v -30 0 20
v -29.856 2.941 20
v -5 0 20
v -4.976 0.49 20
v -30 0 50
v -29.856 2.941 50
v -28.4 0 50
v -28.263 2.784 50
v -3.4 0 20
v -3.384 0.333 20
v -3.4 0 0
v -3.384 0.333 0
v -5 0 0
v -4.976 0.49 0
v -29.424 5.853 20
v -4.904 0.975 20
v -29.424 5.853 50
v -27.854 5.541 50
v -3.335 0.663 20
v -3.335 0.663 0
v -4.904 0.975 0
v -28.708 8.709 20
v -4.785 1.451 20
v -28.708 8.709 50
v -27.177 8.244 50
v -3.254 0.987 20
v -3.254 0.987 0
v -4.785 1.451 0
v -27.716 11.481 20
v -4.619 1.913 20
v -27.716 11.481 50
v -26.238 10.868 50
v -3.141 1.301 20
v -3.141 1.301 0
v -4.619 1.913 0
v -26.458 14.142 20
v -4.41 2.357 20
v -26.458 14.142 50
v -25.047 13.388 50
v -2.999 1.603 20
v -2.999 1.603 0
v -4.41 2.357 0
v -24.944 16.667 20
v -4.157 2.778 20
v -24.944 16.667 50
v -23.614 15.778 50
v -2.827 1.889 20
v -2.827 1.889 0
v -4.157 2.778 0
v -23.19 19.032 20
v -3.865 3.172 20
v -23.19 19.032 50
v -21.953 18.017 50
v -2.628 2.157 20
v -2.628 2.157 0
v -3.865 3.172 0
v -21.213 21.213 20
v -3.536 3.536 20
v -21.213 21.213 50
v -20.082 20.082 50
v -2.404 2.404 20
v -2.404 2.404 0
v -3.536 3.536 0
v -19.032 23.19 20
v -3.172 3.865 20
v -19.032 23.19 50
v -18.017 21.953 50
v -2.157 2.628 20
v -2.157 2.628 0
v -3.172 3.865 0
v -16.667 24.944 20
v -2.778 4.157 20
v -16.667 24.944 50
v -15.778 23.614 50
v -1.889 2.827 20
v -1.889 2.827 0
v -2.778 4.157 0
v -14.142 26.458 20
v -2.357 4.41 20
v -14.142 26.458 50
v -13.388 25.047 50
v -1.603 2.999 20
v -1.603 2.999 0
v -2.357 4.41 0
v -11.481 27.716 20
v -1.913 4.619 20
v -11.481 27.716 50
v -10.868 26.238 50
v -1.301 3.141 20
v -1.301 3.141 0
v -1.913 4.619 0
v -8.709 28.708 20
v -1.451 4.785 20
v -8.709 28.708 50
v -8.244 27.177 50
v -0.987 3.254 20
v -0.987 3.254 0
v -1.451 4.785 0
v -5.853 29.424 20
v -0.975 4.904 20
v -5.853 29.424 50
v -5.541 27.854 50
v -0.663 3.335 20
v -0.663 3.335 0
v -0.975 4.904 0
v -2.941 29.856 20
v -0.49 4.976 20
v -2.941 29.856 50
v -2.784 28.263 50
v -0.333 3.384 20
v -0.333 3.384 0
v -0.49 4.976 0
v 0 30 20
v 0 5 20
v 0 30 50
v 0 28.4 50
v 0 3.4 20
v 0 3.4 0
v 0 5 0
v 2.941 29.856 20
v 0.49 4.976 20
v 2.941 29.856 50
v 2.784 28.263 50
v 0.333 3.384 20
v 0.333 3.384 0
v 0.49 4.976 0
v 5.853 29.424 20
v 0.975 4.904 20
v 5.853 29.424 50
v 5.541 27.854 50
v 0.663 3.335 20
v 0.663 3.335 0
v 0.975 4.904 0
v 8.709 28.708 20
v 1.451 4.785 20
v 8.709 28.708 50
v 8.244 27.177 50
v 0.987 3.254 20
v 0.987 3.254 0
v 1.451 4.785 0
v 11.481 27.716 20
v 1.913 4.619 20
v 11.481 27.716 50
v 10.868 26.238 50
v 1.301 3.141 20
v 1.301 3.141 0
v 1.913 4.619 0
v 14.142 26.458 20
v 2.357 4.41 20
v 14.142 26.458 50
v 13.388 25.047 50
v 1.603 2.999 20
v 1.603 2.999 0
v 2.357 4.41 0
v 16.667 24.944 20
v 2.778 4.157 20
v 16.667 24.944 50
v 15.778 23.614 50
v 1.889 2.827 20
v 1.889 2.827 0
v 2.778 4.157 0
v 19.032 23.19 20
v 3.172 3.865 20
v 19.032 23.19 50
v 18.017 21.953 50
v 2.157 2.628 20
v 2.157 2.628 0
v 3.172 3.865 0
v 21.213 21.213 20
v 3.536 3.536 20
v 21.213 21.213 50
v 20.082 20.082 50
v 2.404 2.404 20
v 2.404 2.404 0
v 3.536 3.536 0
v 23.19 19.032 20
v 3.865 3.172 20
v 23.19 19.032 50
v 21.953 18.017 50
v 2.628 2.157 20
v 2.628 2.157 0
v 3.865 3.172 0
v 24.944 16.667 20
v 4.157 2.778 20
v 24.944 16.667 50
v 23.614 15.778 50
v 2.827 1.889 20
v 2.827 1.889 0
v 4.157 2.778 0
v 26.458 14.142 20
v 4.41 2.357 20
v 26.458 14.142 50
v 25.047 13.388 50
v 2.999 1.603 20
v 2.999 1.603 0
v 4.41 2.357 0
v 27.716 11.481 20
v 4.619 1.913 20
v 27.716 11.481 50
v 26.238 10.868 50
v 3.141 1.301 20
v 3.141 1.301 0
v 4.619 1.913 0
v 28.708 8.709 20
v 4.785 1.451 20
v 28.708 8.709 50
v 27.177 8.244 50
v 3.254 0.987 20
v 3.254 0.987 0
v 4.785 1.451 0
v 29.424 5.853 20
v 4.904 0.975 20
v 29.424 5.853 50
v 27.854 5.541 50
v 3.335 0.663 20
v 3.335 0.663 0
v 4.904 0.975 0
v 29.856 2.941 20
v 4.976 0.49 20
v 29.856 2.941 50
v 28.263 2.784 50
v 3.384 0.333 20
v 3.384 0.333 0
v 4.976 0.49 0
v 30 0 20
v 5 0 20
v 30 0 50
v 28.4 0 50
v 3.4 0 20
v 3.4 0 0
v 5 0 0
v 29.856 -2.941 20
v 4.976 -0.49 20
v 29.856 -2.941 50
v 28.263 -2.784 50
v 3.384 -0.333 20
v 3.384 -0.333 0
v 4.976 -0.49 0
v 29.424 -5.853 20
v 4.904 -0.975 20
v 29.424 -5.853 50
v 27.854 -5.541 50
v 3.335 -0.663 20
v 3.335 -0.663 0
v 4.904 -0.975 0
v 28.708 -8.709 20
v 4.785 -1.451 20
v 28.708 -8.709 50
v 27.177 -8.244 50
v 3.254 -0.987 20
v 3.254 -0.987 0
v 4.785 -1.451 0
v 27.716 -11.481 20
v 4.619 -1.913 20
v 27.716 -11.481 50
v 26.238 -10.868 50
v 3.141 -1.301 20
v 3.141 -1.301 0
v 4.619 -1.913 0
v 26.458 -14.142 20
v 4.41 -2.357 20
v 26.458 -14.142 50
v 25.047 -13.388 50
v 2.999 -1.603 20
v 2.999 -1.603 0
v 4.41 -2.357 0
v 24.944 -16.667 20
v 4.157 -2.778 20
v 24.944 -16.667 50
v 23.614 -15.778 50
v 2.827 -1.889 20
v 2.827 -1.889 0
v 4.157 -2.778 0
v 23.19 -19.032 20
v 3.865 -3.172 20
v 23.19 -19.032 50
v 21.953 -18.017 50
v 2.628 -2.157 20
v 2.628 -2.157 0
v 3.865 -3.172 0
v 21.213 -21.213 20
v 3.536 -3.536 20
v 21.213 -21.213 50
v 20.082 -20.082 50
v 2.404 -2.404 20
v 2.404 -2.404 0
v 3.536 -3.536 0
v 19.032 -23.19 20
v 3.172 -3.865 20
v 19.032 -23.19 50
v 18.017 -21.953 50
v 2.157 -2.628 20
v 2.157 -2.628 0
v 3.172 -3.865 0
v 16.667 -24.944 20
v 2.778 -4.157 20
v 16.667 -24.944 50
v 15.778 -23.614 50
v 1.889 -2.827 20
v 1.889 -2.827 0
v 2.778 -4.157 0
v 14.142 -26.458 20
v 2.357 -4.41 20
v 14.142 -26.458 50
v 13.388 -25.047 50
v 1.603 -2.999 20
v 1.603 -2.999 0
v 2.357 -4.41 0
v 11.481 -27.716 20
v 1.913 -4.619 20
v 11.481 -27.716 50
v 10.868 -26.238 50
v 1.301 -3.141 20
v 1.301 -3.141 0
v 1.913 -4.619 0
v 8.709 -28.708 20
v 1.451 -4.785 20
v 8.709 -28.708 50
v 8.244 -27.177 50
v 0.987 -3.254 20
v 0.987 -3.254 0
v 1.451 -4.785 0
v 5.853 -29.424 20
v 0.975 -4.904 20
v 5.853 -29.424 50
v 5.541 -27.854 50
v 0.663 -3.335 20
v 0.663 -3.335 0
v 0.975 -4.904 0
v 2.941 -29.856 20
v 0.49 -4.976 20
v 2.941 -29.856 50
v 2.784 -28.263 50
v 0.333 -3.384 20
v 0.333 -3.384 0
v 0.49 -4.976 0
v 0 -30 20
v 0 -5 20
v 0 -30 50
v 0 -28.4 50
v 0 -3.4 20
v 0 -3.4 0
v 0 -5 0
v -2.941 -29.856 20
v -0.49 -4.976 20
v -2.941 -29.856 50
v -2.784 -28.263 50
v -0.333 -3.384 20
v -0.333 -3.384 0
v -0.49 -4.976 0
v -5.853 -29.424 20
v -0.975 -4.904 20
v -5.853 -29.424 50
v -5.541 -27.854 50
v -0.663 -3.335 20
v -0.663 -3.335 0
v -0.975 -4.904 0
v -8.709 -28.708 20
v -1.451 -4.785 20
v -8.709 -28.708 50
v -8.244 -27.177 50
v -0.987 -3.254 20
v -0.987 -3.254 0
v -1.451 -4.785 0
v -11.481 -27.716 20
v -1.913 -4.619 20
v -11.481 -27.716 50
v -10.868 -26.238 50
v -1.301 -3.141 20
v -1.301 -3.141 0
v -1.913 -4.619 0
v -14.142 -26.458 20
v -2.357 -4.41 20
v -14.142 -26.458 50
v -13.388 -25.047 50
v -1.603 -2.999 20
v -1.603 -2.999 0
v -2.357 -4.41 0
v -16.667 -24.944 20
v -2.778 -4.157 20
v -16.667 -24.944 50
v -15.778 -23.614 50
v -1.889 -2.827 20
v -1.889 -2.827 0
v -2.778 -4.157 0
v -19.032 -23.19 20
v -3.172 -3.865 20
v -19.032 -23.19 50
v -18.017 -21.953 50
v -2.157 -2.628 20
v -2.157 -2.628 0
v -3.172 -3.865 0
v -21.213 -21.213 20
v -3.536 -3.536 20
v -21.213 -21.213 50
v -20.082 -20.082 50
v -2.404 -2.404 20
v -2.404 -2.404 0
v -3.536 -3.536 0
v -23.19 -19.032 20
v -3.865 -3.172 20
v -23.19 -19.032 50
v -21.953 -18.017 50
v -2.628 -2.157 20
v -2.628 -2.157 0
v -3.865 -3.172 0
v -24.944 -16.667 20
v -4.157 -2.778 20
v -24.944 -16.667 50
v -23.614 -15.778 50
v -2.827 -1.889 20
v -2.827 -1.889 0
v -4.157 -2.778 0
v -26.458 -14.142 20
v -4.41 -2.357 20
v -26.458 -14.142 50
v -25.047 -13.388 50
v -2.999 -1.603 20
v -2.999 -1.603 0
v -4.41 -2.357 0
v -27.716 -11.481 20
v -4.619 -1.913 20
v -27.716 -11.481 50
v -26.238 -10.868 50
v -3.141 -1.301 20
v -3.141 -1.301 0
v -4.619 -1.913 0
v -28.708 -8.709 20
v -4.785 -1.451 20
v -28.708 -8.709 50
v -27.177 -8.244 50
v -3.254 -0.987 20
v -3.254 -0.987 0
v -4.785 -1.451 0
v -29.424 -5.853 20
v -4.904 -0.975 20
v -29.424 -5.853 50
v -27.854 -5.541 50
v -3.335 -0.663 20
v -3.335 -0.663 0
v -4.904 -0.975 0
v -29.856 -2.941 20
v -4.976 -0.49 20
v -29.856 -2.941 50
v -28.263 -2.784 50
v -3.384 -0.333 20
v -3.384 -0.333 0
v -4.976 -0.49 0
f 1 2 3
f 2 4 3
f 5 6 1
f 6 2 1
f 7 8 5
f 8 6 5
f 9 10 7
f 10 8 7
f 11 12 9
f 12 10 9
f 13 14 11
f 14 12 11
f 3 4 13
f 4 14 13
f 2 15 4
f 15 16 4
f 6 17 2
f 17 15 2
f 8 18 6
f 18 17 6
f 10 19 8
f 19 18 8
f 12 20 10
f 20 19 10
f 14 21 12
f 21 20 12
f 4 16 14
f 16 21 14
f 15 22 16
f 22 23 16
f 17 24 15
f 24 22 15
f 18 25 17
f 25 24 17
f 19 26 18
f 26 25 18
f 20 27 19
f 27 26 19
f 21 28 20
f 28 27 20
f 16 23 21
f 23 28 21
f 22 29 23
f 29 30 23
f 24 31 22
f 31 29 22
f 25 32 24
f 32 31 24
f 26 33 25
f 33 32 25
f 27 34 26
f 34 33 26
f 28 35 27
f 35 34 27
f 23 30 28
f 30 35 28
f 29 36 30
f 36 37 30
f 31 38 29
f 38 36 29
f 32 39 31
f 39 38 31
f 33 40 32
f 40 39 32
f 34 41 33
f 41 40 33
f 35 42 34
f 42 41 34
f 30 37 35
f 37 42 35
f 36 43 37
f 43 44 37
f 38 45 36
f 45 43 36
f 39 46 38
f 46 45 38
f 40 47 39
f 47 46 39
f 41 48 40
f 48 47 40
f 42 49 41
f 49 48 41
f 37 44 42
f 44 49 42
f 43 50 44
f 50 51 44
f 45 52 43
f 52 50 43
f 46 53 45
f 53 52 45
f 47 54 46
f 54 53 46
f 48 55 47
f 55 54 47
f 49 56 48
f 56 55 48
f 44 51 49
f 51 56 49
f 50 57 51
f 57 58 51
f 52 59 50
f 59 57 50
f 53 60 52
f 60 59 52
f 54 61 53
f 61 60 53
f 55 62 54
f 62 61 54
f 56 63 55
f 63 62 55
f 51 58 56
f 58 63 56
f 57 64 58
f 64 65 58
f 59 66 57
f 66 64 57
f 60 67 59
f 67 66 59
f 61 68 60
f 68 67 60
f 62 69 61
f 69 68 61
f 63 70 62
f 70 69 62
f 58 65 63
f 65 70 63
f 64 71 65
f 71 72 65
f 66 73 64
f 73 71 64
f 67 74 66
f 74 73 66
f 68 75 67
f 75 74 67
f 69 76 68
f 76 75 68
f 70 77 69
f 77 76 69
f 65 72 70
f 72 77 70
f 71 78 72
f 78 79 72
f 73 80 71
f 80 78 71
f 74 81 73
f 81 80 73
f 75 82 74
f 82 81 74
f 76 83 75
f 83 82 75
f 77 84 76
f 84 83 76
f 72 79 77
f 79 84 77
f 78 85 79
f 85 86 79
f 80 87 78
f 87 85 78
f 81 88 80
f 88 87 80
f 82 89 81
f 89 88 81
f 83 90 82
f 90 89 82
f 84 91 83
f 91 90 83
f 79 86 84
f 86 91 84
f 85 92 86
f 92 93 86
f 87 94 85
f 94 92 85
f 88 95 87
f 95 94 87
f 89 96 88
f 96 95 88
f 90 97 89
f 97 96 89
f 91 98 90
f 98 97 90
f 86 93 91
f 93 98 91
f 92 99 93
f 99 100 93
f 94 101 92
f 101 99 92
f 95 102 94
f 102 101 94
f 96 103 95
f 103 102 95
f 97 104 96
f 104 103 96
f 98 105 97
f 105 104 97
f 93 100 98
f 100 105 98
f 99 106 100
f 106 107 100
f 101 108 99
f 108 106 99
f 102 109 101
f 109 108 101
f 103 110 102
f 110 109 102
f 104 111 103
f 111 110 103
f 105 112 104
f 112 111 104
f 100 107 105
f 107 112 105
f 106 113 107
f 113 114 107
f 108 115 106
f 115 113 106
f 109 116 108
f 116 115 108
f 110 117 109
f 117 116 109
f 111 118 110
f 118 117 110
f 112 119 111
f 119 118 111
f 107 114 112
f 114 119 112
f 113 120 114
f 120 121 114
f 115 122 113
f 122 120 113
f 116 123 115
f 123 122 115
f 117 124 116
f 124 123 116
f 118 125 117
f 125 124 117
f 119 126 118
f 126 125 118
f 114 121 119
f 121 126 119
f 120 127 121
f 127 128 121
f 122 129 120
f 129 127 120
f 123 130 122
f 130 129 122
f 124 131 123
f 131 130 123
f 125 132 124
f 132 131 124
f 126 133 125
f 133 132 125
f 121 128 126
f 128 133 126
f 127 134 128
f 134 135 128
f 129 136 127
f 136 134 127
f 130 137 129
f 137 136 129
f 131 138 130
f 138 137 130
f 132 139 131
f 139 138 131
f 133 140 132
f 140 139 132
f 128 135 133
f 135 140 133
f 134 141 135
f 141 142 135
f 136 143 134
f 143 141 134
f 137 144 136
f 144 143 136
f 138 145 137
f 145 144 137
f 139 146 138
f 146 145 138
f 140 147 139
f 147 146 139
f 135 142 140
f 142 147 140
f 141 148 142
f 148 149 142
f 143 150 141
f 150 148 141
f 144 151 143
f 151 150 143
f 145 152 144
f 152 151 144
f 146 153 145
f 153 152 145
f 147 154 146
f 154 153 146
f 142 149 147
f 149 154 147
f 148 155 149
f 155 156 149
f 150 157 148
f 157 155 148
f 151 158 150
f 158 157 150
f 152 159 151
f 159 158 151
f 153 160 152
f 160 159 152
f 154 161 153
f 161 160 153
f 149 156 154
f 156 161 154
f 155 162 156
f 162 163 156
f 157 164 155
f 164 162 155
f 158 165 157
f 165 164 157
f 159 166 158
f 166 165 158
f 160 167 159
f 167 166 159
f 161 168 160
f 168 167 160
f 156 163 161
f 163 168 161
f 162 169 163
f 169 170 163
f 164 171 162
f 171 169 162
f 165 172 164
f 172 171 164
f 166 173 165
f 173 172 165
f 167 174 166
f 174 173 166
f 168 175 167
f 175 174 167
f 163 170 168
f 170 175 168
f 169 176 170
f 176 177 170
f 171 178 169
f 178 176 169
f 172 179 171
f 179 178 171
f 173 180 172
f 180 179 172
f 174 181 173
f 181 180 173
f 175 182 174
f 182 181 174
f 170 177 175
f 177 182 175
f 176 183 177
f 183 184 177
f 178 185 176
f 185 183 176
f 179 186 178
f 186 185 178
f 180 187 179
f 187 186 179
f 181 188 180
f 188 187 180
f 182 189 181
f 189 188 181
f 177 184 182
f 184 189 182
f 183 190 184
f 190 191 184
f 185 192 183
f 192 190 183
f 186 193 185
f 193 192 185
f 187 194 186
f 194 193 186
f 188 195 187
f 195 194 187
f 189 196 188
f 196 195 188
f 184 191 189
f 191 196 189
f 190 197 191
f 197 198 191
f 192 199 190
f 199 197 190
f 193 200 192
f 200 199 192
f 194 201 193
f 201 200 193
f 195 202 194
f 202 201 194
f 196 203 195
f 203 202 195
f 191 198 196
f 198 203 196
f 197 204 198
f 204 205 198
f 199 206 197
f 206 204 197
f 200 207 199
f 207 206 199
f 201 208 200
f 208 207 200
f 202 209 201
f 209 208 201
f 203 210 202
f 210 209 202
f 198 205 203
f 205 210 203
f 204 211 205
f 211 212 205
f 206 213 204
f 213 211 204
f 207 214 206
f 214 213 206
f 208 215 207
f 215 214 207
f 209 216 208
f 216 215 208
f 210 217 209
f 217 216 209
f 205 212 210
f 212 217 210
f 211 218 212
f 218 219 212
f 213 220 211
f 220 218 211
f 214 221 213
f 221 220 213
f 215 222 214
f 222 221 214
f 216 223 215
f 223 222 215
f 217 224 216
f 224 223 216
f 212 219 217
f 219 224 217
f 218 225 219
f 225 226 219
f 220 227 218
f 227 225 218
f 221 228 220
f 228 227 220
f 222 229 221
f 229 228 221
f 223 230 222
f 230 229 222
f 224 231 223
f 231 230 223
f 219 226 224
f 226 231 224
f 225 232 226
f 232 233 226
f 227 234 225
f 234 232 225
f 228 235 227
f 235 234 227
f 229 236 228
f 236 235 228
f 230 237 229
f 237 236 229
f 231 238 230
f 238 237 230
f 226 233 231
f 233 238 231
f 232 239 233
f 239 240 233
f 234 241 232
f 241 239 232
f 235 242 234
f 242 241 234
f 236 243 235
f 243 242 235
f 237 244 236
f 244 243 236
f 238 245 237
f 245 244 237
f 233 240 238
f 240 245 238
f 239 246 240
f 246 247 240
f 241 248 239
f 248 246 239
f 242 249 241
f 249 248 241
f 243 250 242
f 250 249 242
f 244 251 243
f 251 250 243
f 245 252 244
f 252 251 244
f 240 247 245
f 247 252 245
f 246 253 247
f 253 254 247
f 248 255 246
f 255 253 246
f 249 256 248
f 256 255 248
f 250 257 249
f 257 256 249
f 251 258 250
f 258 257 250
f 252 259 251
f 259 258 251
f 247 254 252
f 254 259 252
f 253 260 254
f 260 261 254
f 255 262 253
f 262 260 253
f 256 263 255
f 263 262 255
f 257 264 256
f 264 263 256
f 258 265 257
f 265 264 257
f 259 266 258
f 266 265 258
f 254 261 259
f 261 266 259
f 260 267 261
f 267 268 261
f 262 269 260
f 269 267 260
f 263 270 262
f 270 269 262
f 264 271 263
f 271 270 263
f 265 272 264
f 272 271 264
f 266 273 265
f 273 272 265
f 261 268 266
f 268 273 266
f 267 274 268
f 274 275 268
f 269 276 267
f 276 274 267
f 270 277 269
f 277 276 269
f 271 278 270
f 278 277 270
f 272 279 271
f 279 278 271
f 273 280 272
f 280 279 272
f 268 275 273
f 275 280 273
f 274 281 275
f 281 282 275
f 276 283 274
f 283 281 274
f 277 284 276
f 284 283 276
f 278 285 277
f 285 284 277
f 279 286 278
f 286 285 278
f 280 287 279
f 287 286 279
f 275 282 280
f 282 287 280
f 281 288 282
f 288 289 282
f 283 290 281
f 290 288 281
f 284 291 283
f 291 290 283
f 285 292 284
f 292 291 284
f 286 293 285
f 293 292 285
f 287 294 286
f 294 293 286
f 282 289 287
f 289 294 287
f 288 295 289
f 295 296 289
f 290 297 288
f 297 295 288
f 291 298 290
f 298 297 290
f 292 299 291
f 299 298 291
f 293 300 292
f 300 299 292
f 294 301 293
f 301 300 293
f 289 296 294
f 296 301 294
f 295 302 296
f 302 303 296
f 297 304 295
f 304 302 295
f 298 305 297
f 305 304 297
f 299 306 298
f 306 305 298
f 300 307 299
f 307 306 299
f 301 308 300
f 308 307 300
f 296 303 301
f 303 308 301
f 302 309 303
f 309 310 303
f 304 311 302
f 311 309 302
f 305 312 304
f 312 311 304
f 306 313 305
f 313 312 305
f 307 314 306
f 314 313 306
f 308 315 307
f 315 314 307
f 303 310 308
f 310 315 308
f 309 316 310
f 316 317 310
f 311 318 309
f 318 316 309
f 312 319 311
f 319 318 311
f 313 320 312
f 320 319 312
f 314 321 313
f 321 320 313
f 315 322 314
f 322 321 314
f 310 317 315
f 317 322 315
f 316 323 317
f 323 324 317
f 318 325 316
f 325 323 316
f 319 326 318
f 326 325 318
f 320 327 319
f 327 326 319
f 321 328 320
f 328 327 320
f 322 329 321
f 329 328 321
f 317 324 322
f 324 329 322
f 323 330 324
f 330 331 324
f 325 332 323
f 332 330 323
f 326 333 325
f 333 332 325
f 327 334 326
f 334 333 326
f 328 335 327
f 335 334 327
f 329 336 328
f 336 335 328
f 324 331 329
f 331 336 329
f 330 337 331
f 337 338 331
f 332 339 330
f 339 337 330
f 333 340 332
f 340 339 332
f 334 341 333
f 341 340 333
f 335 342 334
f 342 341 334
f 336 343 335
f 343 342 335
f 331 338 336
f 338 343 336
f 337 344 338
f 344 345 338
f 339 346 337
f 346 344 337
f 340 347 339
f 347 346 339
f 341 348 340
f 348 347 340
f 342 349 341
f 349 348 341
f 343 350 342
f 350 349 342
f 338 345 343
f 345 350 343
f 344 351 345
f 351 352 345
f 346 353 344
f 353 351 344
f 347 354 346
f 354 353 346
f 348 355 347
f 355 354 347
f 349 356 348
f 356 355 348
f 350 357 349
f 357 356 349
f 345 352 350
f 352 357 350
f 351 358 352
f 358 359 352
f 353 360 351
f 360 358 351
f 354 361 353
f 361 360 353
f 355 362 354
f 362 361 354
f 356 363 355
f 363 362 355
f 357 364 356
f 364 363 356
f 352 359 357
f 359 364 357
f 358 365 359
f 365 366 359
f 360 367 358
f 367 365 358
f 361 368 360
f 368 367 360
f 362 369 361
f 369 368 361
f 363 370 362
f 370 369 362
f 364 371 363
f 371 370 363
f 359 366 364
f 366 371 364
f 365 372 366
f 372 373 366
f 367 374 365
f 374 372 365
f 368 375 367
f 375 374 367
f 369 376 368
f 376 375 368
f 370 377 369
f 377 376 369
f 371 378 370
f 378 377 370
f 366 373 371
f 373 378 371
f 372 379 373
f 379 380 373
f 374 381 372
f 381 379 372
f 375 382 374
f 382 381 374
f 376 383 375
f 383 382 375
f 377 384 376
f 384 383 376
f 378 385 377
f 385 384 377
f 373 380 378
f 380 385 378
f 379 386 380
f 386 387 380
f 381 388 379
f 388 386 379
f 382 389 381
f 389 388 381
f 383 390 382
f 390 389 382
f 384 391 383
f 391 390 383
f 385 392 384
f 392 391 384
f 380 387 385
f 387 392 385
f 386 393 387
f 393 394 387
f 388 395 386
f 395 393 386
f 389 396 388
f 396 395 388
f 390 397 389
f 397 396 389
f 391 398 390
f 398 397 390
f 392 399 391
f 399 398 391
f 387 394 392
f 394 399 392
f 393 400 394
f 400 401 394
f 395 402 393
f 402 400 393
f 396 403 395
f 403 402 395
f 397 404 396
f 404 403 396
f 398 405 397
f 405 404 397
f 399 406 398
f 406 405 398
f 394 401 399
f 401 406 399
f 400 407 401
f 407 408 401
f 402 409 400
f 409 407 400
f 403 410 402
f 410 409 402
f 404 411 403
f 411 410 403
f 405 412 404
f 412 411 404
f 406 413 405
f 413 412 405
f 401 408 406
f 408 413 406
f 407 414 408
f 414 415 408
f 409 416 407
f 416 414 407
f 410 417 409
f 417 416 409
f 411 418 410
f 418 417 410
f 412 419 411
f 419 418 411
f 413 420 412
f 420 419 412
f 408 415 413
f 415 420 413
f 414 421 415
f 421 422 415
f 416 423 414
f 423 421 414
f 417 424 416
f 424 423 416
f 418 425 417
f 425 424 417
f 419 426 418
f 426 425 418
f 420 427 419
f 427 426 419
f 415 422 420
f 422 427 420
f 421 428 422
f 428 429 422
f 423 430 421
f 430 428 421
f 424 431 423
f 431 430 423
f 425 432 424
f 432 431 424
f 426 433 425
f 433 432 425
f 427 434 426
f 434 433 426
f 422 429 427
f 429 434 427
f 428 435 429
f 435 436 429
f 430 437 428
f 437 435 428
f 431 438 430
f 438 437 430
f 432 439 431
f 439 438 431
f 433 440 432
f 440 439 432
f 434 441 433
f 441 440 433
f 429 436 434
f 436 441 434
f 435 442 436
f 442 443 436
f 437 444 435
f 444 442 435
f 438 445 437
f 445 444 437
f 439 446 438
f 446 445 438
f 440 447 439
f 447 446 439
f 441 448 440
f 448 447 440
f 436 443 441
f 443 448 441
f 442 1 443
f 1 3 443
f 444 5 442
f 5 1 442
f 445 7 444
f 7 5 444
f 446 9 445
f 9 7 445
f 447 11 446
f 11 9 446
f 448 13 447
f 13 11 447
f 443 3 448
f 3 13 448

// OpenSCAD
// Lab funnel dimensions
spout_od = 10;            // Outer diameter of straight spout
spout_bottom_z = 0;       // Z position of spout bottom
spout_top_z = 20;         // Z position where spout meets cone
cone_top_od = 10;         // Outer diameter at cone top (matches spout)
cone_bottom_od = 60;      // Outer diameter at cone rim
cone_top_z = 20;          // Z position of cone top
cone_bottom_z = 50;       // Z position of cone rim
wall_thickness = 1.6;     // Wall thickness everywhere

// Calculate radii
spout_or = spout_od / 2;
spout_ir = (spout_od - 2 * wall_thickness) / 2;
cone_or = cone_bottom_od / 2;
cone_ir = (cone_bottom_od - 2 * wall_thickness) / 2;

// Define 2D cross-section of the wall (r, z)
// Traces the material from inner bottom, up inner wall, across top rim, down outer wall, across bottom rim
pts = [
  [spout_ir, spout_bottom_z],
  [spout_ir, spout_top_z],
  [cone_ir, cone_bottom_z],
  [cone_or, cone_bottom_z],
  [cone_or, spout_top_z],
  [spout_or, spout_top_z],
  [spout_or, spout_bottom_z]
];

// Revolve the cross-section to create the solid funnel
rotate_extrude($fn = 64) polygon(pts);
